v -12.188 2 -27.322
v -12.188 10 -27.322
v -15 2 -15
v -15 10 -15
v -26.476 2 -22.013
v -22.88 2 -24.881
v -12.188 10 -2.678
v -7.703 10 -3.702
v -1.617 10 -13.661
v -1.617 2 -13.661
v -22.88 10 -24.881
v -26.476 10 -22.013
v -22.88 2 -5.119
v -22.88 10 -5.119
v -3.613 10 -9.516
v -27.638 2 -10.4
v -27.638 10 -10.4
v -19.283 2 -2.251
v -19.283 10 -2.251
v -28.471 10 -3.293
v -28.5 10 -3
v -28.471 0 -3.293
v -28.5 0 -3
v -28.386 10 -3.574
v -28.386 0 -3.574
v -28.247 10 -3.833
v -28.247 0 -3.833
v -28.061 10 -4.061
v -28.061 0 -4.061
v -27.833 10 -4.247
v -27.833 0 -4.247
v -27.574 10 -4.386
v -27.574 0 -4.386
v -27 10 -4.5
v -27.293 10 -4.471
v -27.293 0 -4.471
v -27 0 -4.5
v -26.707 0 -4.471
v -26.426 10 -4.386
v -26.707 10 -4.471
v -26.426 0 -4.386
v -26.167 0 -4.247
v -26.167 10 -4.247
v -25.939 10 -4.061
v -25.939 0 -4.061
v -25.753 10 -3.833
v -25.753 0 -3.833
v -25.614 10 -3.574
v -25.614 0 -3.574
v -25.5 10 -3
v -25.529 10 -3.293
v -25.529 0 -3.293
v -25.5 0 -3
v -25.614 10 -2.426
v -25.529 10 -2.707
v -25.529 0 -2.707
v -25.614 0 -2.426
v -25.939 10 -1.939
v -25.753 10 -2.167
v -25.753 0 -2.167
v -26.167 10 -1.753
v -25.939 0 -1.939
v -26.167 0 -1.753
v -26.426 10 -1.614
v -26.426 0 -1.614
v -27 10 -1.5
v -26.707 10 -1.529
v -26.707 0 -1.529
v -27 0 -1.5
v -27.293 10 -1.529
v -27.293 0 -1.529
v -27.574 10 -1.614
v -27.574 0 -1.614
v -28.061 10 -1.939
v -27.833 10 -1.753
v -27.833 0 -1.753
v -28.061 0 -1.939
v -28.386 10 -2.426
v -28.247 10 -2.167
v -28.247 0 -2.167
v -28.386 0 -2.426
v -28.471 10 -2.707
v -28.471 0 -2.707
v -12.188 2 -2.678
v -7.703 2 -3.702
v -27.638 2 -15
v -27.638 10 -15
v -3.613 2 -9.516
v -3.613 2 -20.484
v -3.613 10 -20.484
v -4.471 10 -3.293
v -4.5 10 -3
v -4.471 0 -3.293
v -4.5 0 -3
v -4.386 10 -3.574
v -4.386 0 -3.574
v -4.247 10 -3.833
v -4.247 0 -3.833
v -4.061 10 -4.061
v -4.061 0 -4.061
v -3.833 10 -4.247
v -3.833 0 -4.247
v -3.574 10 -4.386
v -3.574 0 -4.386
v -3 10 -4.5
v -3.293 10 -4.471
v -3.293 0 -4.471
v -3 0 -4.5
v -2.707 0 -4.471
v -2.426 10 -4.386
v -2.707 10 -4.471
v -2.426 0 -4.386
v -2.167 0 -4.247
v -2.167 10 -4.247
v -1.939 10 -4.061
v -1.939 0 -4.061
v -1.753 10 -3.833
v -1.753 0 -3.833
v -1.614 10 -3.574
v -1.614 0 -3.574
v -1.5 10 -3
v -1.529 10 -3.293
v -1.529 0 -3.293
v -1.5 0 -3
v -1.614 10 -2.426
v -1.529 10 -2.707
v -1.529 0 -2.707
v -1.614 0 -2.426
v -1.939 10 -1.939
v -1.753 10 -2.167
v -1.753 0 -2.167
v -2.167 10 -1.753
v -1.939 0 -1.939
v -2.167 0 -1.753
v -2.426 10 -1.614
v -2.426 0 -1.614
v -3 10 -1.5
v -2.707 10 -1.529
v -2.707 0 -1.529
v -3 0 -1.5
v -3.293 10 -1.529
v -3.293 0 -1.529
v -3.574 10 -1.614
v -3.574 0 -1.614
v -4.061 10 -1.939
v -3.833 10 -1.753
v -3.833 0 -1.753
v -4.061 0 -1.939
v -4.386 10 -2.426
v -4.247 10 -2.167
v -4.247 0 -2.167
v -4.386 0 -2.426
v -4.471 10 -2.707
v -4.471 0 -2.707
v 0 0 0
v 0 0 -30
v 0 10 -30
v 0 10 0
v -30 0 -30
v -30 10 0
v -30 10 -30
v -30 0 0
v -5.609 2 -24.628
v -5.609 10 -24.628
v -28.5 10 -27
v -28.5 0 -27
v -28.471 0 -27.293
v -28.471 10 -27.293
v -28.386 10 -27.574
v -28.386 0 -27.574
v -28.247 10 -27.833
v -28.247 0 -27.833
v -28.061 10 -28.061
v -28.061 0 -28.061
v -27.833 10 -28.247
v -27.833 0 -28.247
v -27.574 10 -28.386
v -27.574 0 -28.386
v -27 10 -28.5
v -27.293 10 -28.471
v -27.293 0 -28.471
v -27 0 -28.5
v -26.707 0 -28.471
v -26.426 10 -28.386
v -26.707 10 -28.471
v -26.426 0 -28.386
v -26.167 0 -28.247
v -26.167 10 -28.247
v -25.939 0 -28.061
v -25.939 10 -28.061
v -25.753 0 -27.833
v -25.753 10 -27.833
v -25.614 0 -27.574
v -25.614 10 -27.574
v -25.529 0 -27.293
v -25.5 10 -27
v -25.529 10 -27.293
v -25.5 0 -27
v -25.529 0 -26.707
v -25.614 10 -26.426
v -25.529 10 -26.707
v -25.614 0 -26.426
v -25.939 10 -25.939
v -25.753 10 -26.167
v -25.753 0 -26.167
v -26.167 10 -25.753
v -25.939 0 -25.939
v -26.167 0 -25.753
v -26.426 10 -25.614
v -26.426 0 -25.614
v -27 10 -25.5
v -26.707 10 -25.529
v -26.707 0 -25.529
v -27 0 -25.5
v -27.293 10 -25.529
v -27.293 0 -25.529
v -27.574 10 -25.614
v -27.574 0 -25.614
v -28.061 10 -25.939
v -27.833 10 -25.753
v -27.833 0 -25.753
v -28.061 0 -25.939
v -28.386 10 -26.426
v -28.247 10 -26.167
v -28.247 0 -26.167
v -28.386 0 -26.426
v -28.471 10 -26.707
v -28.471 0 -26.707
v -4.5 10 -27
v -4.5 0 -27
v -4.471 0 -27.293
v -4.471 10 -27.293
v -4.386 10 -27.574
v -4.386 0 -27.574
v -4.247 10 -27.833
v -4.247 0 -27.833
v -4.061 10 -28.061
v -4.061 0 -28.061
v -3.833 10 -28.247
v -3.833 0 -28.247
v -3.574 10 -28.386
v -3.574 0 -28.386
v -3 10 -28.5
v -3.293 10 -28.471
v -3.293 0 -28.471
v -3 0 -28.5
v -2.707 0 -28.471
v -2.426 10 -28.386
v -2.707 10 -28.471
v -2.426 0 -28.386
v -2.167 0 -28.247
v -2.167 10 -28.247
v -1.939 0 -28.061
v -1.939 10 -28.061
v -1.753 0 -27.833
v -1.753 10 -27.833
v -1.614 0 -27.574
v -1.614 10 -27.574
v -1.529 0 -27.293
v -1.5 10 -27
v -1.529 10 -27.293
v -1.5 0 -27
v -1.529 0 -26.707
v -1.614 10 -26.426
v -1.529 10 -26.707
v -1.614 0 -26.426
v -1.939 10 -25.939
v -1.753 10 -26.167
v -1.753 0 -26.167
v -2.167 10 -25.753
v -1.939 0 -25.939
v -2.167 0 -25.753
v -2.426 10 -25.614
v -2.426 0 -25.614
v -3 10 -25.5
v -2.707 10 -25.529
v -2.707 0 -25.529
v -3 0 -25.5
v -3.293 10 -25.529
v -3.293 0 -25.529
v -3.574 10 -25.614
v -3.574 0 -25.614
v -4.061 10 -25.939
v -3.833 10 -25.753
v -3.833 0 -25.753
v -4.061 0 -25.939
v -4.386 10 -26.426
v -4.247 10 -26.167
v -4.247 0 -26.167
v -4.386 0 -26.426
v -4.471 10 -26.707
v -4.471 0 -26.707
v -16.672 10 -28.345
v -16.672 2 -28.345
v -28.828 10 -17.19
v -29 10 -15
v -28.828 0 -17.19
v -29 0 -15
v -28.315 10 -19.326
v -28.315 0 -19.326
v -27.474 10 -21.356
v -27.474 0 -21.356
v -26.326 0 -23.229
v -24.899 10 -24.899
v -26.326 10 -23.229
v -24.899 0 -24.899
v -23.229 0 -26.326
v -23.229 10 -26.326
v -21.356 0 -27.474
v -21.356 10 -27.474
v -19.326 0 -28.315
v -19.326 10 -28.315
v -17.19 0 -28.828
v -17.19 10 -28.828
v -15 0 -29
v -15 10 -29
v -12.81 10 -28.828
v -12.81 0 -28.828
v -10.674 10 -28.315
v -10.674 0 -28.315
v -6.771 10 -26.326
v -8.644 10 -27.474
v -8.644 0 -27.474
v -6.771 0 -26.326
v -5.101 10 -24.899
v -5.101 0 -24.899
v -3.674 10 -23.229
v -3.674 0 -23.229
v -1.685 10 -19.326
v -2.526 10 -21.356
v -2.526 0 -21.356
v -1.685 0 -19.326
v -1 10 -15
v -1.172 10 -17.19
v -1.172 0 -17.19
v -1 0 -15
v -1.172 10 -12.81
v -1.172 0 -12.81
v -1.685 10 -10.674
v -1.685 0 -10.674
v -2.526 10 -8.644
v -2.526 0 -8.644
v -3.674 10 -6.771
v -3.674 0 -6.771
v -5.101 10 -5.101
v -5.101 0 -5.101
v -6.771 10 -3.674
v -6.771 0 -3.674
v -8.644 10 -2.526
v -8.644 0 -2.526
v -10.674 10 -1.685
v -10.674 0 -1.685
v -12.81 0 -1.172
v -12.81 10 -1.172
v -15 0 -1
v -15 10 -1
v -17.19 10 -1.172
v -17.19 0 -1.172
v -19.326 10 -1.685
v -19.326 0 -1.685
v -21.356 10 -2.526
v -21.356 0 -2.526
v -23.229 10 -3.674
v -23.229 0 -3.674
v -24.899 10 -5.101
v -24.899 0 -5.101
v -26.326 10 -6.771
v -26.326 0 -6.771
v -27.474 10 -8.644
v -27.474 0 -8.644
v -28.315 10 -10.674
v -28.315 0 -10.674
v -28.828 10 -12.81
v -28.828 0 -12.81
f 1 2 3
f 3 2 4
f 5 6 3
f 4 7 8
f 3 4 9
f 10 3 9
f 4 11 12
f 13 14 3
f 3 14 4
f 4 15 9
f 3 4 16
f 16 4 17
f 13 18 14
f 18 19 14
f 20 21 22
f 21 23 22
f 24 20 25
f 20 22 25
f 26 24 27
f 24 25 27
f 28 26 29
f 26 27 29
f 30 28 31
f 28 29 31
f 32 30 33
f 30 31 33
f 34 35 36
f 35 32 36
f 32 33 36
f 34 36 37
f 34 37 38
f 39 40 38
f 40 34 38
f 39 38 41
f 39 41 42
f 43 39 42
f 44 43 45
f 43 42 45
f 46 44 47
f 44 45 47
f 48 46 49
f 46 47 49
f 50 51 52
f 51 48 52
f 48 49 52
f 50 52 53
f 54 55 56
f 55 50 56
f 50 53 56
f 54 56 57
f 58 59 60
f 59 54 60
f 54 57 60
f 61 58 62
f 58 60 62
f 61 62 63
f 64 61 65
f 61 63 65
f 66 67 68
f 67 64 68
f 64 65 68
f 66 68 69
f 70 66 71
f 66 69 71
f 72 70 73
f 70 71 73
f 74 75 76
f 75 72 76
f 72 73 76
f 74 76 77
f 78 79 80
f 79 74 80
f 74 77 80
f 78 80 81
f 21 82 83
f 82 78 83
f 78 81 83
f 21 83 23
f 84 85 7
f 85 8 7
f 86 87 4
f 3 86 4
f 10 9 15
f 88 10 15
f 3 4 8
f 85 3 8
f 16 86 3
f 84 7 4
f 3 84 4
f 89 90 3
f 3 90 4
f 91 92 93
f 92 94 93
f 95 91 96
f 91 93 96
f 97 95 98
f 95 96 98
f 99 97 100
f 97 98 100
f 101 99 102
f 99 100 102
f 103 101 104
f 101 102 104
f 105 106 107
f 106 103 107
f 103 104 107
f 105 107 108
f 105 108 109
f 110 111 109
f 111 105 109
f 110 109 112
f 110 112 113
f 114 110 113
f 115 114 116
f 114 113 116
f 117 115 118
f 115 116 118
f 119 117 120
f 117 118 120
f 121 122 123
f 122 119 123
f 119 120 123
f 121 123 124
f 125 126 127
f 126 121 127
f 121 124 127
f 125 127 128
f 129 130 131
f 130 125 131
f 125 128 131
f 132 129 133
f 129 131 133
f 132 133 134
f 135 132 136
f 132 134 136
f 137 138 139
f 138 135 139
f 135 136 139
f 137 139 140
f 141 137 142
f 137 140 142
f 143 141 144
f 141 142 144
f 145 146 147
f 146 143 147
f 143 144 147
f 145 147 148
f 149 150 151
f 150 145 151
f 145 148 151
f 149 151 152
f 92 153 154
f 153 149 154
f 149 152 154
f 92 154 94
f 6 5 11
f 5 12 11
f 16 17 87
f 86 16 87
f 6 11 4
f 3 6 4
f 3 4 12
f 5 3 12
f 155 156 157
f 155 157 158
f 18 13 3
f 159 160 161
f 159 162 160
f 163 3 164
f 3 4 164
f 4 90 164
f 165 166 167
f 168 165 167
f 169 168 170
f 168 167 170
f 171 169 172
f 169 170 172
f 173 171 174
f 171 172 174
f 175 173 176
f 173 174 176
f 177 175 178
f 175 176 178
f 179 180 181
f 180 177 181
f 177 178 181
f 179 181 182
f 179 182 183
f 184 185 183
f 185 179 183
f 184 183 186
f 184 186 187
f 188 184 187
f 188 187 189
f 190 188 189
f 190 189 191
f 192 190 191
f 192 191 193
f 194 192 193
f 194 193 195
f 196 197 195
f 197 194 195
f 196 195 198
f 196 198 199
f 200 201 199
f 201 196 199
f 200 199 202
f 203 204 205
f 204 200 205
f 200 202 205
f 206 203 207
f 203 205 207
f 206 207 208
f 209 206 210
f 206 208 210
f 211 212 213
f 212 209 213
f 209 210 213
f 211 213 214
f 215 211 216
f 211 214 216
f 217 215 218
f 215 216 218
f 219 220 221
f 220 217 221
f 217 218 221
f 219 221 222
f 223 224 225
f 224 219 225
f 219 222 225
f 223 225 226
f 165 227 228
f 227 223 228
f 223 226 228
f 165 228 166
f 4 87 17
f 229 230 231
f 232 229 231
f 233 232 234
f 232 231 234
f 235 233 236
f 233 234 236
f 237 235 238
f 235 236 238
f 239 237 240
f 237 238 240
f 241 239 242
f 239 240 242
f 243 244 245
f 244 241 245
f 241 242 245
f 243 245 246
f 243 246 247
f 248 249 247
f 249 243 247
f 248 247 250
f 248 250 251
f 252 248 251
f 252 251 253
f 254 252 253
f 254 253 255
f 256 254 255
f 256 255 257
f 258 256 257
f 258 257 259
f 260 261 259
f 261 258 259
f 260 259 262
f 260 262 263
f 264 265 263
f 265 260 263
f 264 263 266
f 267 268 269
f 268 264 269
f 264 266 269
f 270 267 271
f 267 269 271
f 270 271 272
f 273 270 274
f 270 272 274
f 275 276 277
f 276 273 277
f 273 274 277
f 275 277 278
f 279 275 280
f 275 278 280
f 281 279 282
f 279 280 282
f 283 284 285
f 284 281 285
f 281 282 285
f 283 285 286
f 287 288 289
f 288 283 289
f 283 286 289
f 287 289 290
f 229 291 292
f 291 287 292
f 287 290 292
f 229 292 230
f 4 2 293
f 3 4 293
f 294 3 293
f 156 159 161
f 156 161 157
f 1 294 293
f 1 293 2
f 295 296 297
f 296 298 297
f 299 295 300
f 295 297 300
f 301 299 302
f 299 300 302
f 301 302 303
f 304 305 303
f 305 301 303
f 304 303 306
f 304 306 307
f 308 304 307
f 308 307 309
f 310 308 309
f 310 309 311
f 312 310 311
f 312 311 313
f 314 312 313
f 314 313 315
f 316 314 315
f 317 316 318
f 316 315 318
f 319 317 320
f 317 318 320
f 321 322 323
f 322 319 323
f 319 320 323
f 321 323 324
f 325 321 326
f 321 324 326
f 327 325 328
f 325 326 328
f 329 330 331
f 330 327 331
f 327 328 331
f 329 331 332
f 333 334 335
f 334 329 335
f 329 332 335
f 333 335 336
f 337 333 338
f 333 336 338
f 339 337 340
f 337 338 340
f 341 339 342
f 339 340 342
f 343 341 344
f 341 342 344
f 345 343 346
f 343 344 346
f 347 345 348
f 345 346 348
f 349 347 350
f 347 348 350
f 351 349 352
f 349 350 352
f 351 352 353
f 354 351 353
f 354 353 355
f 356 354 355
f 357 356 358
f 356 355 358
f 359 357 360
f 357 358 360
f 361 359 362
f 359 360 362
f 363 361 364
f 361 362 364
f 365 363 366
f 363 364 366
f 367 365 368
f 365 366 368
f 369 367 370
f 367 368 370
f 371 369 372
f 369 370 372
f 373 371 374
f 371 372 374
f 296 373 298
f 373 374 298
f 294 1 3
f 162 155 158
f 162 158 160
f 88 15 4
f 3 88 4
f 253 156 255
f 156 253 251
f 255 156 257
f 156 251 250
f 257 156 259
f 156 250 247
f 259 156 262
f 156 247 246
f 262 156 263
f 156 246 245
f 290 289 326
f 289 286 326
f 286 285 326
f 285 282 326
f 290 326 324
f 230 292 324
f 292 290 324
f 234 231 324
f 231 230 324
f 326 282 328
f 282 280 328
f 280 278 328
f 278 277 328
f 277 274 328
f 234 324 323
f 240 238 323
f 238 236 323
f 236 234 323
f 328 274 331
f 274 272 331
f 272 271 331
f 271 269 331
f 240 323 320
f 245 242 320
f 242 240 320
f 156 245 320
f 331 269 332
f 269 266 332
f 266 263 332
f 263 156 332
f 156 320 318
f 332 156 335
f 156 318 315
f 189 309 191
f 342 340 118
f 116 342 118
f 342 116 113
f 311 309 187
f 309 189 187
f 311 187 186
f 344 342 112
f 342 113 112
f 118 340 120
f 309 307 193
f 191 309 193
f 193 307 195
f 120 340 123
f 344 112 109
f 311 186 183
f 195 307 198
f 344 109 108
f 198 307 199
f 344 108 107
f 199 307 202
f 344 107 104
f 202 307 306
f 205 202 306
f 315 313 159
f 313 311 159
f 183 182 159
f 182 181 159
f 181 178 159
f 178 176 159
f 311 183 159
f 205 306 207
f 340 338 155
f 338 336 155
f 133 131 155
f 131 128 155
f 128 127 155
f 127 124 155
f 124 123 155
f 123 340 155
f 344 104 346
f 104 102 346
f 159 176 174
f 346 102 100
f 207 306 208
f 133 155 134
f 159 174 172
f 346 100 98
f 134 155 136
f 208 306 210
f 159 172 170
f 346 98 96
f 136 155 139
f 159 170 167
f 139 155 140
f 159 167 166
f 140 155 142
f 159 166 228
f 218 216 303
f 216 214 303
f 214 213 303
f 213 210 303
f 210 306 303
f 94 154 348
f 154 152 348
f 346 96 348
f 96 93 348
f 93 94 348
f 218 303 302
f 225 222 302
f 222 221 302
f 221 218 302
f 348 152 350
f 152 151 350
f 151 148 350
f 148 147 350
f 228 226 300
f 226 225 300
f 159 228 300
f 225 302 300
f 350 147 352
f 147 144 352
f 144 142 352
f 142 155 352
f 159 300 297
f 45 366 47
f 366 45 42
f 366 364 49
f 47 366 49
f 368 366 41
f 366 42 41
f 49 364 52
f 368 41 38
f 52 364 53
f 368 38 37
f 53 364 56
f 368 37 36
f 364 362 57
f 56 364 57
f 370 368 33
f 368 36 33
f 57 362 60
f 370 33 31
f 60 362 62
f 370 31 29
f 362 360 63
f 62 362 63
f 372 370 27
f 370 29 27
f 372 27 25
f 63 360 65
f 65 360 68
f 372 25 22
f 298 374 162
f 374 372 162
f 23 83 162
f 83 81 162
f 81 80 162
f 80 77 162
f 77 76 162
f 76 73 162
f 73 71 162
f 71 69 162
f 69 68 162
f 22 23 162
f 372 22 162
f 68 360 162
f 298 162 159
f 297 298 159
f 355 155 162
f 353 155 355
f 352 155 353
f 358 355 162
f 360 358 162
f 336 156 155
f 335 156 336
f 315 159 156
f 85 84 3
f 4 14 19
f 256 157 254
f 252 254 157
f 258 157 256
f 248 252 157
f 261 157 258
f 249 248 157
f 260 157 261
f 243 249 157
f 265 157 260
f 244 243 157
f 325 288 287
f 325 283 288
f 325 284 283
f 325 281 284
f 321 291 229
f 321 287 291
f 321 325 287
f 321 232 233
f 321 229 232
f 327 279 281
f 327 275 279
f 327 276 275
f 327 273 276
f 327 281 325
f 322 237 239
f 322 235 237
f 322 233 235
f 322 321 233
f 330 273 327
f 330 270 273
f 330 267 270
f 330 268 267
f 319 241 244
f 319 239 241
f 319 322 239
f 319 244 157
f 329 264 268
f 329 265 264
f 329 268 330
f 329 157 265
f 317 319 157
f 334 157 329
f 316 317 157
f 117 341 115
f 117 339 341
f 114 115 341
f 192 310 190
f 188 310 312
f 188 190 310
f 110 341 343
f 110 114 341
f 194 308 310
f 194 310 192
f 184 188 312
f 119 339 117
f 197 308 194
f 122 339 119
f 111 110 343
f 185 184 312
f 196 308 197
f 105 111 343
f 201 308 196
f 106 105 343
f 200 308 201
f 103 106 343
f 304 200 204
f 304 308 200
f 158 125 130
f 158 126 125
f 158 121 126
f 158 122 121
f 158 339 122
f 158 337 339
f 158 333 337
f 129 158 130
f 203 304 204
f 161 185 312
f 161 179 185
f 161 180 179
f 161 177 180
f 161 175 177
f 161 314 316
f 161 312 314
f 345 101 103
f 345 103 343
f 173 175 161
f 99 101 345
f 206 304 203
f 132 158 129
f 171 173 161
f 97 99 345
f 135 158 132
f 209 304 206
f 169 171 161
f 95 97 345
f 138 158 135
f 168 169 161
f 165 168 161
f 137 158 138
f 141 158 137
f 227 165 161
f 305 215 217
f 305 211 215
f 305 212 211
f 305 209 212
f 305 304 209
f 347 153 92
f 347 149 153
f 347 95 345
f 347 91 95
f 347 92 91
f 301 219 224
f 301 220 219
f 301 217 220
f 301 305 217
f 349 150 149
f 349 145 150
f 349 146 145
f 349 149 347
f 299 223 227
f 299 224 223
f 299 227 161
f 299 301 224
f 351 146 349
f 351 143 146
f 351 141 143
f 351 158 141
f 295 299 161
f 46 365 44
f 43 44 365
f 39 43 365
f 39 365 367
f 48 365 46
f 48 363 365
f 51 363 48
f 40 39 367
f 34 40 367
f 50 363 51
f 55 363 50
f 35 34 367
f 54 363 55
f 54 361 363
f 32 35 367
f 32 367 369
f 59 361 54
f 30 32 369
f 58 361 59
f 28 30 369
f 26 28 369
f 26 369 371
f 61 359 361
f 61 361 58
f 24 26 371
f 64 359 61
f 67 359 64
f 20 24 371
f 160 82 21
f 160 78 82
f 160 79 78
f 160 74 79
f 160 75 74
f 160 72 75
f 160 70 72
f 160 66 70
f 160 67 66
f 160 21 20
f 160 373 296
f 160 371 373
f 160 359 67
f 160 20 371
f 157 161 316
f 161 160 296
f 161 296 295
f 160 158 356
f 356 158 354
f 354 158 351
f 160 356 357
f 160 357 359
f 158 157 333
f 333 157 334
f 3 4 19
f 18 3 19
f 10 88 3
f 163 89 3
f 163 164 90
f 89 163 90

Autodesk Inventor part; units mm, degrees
ref_plane "YZ Plane" through (0, 0, 0) normal (1, 0, 0) x (0, 1, 0)
ref_plane "XZ Plane" through (0, 0, 0) normal (0, 1, 0) x (-1, 0, 0)
ref_plane "XY Plane" through (0, 0, 0) normal (0, 0, 1) x (1, 0, 0)
sketch "Sketch1" plane through (0, 0, 0) normal (0, 1, 0) x (-1, 0, 0)
  line L0 (0, 0) -> (30, 0)
  line L1 (30, 0) -> (30, -30)
  line L2 (30, -30) -> (0, -30)
  line L3 (0, -30) -> (0, 0)
  circle A0 centre (3, -3) radius 1.5
  circle A1 centre (3, -27) radius 1.5
  circle A2 centre (27, -3) radius 1.5
  circle A3 centre (27, -27) radius 1.5
  circle A4 centre (15, -15) radius 14
  dimension "d0" = 30
  dimension "d1" = 30
  dimension "d2" = 3
  dimension "d3" = 24
  dimension "d4" = 24
  dimension "d5" = 3
  dimension "d6" = 3
  dimension "d7" = 28
  dimension "d8" = 15
  dimension "d9" = 15
extrude "Extrusion1" add sketch "Sketch1" along normal blind 10
sketch "Sketch2" plane through (0, 10, 0) normal (0, 1, 0) x (1, 0, 0)
  circle A0 centre (-15, 15) radius 14 projected
  line L0 (-15, 15) -> (-27.6384, 10.4)
  line L1 (-27.6384, 10.4) -> (-27.6384, 15)
  line L2 (-27.6384, 15) -> (-15, 15)
  dimension "d12" = 70
  dimension "d13" = 4.6
extrude "Extrusion2" add sketch "Sketch2" against normal blind 8 contours L0 L1 L2
pattern_circular "Circular Pattern1" count 7 over 360 about axis through (-15, 10, -15) along (0, -1, 0) of "Extrusion2"
properties part number "Fan30mm" material "ABS Plastic"
